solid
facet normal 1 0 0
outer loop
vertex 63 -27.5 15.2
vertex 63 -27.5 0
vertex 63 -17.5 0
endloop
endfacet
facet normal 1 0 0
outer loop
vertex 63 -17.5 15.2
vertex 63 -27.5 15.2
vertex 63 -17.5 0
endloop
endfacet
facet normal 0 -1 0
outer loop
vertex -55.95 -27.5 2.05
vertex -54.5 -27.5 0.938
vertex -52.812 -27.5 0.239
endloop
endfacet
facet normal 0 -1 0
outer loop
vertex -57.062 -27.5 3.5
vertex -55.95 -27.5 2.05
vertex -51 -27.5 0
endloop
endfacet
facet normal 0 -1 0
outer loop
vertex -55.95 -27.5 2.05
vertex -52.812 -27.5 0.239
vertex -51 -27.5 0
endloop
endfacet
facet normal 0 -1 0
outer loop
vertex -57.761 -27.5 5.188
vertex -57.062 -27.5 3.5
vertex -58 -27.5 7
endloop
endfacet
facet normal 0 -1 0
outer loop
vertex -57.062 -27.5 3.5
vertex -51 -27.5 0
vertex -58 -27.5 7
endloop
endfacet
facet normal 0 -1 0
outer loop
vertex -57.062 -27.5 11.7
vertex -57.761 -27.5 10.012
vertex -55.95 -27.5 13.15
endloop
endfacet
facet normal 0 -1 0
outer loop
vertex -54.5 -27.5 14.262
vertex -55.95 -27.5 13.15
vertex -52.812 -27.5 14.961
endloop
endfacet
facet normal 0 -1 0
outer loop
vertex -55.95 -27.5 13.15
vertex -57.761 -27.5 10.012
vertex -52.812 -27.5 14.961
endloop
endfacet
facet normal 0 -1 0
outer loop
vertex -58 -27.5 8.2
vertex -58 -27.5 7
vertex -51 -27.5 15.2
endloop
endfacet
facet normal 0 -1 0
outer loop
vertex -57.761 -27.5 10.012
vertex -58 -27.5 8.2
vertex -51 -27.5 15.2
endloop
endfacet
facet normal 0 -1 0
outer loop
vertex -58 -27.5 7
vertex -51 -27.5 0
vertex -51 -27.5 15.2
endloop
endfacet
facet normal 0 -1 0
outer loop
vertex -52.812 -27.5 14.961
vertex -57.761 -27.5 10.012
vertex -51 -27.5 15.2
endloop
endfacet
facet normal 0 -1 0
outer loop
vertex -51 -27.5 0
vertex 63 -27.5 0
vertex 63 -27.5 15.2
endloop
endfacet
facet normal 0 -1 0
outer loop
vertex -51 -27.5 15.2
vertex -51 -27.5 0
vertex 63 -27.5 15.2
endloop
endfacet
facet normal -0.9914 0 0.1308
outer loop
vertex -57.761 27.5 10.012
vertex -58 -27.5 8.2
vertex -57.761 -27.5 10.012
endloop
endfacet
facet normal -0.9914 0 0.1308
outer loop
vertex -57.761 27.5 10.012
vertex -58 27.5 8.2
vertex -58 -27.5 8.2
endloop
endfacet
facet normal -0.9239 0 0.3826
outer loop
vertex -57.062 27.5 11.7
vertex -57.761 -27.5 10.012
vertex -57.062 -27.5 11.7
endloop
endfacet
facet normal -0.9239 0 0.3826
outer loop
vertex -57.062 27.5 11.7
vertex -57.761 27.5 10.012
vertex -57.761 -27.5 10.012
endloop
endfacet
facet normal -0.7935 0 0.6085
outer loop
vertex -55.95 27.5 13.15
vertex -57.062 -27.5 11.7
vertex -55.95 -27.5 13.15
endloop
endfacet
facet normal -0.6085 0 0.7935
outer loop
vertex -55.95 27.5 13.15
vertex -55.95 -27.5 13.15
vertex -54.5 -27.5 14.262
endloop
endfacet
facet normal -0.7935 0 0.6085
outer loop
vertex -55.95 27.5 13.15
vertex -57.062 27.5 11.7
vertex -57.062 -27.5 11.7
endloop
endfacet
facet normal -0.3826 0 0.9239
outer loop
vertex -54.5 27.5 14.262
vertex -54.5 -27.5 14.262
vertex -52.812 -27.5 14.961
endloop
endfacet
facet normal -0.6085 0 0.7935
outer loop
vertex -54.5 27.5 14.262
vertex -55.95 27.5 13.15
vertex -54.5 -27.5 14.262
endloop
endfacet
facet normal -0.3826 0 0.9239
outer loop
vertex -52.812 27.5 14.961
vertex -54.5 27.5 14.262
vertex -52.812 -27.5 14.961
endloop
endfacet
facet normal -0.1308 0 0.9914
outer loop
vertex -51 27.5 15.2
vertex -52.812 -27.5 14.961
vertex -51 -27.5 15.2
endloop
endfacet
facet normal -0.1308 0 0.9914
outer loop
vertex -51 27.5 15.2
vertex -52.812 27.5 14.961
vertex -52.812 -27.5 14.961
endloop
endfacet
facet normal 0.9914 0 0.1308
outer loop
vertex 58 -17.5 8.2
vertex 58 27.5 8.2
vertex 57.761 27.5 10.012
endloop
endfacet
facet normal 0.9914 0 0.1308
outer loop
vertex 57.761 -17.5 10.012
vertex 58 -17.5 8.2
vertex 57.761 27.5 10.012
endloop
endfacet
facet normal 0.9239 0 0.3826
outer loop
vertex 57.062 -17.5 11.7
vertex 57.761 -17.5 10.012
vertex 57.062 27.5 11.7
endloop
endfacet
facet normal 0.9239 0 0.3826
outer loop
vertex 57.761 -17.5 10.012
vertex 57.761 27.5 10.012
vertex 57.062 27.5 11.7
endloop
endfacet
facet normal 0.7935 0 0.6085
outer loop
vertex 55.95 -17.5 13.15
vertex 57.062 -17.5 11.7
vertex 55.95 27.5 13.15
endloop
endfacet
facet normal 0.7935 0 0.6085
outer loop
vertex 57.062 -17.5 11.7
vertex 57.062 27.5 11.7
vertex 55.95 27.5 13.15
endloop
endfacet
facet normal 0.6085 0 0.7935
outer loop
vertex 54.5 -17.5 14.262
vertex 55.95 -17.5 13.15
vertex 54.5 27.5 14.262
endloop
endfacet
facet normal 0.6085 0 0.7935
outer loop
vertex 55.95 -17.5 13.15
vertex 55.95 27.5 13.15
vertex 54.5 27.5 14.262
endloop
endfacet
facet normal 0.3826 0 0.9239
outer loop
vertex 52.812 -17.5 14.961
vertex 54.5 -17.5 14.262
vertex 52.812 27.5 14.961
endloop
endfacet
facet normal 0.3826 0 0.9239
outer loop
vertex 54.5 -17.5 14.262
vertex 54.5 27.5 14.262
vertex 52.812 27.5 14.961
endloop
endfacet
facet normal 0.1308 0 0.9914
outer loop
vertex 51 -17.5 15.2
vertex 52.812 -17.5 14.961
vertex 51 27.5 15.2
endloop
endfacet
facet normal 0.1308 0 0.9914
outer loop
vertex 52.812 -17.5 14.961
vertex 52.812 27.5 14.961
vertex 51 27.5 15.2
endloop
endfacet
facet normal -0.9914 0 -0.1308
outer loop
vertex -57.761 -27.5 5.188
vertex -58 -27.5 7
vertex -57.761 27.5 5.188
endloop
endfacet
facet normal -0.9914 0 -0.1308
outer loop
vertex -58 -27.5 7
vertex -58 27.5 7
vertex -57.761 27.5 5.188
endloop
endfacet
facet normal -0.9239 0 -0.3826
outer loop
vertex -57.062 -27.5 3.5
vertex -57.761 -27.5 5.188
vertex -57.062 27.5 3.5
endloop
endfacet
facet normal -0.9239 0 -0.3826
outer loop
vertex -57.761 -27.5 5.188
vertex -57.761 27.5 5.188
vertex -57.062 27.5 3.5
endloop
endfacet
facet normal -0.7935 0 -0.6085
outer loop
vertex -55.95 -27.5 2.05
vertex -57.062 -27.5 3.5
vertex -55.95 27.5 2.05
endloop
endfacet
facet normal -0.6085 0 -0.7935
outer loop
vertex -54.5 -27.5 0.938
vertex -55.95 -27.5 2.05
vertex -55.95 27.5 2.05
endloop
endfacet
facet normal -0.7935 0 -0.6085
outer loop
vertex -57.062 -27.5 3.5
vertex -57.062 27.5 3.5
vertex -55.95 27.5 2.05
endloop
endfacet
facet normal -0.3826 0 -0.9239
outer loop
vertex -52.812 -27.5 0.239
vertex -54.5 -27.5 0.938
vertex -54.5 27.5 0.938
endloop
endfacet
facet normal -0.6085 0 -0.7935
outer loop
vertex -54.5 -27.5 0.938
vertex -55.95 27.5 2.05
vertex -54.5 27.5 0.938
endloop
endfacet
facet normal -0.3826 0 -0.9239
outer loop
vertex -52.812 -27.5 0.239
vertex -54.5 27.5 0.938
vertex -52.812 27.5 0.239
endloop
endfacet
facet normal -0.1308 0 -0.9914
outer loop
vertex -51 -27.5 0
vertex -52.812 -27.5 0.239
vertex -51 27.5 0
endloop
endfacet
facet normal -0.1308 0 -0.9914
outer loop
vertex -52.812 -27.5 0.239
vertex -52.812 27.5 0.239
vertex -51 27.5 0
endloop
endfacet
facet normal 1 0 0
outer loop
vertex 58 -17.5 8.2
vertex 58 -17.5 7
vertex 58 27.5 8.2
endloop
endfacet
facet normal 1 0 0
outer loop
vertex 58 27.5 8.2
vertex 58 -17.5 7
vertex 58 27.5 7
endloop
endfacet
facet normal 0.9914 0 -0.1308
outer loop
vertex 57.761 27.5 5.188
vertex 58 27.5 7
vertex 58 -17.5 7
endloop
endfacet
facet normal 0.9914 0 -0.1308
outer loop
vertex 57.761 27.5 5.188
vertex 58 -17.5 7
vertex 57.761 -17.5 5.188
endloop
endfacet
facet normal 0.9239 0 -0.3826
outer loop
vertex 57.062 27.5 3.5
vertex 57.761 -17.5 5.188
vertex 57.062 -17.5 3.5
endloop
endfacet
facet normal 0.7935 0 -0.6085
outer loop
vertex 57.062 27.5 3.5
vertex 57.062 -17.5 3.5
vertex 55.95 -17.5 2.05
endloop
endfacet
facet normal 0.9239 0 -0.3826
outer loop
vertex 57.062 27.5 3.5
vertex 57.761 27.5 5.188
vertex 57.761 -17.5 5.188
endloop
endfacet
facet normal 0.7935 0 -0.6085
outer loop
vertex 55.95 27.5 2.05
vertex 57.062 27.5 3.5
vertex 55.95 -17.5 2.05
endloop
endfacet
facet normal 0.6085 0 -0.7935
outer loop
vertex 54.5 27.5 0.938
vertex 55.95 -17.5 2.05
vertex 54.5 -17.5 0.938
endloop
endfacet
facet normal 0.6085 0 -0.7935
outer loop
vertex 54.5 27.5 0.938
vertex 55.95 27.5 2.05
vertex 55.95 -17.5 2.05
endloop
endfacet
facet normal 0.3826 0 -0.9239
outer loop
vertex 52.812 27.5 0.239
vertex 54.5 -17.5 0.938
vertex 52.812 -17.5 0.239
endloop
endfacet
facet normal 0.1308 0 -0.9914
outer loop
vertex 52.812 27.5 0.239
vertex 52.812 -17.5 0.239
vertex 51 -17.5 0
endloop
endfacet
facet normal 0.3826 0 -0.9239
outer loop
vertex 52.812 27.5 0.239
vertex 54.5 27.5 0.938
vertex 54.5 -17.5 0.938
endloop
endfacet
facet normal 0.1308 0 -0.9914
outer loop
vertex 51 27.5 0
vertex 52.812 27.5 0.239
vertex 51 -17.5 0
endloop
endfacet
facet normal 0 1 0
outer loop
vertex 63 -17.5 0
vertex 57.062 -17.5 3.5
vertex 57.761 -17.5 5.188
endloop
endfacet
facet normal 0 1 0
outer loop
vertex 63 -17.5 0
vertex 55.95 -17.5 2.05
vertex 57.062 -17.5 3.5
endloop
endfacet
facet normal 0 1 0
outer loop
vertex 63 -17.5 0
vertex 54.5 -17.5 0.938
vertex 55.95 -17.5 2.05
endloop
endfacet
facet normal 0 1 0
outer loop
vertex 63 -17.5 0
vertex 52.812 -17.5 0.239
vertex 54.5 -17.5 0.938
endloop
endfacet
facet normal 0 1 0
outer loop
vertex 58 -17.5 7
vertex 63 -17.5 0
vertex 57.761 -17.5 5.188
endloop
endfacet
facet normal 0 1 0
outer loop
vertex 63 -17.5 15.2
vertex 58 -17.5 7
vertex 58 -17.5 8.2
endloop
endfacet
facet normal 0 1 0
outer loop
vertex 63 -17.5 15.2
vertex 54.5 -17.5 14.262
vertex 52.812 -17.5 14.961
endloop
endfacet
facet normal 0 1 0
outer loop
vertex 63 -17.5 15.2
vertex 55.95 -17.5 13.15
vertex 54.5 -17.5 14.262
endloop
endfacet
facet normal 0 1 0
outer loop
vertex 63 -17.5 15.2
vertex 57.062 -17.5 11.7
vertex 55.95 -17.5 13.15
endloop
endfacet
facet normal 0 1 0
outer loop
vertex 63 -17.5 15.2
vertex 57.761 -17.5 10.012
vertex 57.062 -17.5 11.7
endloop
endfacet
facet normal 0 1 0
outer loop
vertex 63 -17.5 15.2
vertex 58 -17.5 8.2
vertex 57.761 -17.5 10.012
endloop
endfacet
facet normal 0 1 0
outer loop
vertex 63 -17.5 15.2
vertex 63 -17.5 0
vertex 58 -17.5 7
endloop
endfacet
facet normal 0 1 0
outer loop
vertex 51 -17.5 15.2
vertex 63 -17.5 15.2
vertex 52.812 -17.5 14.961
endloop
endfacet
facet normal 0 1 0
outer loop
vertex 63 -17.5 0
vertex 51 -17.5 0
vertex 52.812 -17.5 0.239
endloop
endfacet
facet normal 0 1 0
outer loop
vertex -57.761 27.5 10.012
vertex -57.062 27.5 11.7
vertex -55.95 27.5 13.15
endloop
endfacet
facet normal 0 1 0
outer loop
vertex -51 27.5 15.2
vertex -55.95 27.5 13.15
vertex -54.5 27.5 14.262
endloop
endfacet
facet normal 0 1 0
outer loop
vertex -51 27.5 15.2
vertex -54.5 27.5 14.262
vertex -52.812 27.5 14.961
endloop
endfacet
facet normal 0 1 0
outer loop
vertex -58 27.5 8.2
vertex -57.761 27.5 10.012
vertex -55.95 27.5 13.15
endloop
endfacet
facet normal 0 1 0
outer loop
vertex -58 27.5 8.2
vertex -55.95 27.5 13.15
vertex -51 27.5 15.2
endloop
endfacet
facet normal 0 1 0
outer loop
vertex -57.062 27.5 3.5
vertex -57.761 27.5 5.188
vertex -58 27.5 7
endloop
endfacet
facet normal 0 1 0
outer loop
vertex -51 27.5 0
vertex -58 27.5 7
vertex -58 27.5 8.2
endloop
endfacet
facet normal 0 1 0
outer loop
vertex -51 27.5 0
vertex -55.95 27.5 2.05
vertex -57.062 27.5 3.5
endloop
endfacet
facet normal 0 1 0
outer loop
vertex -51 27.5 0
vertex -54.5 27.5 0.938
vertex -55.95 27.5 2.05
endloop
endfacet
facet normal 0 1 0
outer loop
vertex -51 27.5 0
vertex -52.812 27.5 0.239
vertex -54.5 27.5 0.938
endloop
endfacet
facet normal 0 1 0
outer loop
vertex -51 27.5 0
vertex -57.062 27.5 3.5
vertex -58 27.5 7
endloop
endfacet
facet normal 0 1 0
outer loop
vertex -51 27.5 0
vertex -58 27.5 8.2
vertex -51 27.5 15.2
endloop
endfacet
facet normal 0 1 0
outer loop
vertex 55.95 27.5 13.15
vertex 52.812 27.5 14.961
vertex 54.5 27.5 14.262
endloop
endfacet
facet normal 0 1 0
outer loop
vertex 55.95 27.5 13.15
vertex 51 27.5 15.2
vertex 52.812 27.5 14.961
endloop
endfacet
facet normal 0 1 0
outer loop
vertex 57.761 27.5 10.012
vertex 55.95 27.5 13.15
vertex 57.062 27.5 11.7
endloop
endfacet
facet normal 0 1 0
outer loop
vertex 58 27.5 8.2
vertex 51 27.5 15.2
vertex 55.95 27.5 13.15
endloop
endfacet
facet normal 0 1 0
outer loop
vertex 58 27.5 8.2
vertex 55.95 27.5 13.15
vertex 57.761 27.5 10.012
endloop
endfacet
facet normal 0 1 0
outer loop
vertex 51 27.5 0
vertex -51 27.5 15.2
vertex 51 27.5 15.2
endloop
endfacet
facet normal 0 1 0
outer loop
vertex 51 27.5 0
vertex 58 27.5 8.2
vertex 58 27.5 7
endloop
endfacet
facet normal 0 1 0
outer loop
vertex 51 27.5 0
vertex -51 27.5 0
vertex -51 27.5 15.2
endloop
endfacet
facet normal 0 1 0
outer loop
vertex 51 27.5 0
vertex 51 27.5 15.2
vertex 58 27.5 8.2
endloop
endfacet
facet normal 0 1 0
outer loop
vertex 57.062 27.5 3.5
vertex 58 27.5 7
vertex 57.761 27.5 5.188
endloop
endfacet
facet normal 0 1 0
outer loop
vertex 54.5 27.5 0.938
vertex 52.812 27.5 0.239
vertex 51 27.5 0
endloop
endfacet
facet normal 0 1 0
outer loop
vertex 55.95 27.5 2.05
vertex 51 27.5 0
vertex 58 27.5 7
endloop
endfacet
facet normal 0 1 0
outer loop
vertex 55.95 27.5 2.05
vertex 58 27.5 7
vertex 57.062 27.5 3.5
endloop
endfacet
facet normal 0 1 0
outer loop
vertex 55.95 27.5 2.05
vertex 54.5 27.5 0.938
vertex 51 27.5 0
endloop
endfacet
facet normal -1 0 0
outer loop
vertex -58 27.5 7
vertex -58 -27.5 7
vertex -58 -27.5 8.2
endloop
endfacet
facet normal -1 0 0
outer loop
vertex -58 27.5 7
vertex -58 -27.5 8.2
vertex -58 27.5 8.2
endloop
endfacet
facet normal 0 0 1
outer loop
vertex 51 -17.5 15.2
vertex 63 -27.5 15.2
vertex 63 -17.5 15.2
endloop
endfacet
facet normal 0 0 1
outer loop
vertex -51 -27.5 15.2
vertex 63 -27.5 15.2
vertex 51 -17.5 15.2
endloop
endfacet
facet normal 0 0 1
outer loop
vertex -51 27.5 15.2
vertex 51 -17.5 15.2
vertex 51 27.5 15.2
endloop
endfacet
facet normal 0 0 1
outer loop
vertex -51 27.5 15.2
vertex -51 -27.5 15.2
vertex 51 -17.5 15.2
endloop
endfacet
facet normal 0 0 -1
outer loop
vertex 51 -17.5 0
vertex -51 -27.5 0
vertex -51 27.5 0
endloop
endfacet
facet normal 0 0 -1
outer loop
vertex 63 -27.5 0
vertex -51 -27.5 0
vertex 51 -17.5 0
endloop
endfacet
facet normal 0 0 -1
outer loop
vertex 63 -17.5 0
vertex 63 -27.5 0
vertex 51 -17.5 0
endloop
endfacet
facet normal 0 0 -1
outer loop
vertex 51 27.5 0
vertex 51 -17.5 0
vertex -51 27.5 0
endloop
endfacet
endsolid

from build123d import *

# Parameters (mm, degrees)
F0_W          = 116
F0_H          = 55
F1_DEPTH      = 15.2
F2_R          = 7
F3_W          = 10
F3_H          = 15.2
F4_DEPTH      = 5
F4_DEPTH_BACK = 10


with BuildPart() as f1:
    # F0 (on Top) → F1 (new body)
    with BuildSketch(Plane.XY):
        Rectangle(F0_W, F0_H)
    extrude(amount=F1_DEPTH)

    # F2
    f2_edges = [f1.edges().sort_by_distance(p)[0] for p in [
        (58, 0, 15.2),
        (58, 0, 0),
        (-58, 0, 15.2),
        (-58, 0, 0),
    ]]
    fillet(f2_edges, radius=F2_R)

    # F3 (on face) → F4 (join, two sides)
    with BuildSketch(Plane.YZ.offset(58)) as f4_sk:
        with Locations((-22.5, 7.6)):
            Rectangle(F3_W, F3_H)
    extrude(amount=F4_DEPTH)
    extrude(f4_sk.sketch, amount=-F4_DEPTH_BACK)


solid = f1.part
